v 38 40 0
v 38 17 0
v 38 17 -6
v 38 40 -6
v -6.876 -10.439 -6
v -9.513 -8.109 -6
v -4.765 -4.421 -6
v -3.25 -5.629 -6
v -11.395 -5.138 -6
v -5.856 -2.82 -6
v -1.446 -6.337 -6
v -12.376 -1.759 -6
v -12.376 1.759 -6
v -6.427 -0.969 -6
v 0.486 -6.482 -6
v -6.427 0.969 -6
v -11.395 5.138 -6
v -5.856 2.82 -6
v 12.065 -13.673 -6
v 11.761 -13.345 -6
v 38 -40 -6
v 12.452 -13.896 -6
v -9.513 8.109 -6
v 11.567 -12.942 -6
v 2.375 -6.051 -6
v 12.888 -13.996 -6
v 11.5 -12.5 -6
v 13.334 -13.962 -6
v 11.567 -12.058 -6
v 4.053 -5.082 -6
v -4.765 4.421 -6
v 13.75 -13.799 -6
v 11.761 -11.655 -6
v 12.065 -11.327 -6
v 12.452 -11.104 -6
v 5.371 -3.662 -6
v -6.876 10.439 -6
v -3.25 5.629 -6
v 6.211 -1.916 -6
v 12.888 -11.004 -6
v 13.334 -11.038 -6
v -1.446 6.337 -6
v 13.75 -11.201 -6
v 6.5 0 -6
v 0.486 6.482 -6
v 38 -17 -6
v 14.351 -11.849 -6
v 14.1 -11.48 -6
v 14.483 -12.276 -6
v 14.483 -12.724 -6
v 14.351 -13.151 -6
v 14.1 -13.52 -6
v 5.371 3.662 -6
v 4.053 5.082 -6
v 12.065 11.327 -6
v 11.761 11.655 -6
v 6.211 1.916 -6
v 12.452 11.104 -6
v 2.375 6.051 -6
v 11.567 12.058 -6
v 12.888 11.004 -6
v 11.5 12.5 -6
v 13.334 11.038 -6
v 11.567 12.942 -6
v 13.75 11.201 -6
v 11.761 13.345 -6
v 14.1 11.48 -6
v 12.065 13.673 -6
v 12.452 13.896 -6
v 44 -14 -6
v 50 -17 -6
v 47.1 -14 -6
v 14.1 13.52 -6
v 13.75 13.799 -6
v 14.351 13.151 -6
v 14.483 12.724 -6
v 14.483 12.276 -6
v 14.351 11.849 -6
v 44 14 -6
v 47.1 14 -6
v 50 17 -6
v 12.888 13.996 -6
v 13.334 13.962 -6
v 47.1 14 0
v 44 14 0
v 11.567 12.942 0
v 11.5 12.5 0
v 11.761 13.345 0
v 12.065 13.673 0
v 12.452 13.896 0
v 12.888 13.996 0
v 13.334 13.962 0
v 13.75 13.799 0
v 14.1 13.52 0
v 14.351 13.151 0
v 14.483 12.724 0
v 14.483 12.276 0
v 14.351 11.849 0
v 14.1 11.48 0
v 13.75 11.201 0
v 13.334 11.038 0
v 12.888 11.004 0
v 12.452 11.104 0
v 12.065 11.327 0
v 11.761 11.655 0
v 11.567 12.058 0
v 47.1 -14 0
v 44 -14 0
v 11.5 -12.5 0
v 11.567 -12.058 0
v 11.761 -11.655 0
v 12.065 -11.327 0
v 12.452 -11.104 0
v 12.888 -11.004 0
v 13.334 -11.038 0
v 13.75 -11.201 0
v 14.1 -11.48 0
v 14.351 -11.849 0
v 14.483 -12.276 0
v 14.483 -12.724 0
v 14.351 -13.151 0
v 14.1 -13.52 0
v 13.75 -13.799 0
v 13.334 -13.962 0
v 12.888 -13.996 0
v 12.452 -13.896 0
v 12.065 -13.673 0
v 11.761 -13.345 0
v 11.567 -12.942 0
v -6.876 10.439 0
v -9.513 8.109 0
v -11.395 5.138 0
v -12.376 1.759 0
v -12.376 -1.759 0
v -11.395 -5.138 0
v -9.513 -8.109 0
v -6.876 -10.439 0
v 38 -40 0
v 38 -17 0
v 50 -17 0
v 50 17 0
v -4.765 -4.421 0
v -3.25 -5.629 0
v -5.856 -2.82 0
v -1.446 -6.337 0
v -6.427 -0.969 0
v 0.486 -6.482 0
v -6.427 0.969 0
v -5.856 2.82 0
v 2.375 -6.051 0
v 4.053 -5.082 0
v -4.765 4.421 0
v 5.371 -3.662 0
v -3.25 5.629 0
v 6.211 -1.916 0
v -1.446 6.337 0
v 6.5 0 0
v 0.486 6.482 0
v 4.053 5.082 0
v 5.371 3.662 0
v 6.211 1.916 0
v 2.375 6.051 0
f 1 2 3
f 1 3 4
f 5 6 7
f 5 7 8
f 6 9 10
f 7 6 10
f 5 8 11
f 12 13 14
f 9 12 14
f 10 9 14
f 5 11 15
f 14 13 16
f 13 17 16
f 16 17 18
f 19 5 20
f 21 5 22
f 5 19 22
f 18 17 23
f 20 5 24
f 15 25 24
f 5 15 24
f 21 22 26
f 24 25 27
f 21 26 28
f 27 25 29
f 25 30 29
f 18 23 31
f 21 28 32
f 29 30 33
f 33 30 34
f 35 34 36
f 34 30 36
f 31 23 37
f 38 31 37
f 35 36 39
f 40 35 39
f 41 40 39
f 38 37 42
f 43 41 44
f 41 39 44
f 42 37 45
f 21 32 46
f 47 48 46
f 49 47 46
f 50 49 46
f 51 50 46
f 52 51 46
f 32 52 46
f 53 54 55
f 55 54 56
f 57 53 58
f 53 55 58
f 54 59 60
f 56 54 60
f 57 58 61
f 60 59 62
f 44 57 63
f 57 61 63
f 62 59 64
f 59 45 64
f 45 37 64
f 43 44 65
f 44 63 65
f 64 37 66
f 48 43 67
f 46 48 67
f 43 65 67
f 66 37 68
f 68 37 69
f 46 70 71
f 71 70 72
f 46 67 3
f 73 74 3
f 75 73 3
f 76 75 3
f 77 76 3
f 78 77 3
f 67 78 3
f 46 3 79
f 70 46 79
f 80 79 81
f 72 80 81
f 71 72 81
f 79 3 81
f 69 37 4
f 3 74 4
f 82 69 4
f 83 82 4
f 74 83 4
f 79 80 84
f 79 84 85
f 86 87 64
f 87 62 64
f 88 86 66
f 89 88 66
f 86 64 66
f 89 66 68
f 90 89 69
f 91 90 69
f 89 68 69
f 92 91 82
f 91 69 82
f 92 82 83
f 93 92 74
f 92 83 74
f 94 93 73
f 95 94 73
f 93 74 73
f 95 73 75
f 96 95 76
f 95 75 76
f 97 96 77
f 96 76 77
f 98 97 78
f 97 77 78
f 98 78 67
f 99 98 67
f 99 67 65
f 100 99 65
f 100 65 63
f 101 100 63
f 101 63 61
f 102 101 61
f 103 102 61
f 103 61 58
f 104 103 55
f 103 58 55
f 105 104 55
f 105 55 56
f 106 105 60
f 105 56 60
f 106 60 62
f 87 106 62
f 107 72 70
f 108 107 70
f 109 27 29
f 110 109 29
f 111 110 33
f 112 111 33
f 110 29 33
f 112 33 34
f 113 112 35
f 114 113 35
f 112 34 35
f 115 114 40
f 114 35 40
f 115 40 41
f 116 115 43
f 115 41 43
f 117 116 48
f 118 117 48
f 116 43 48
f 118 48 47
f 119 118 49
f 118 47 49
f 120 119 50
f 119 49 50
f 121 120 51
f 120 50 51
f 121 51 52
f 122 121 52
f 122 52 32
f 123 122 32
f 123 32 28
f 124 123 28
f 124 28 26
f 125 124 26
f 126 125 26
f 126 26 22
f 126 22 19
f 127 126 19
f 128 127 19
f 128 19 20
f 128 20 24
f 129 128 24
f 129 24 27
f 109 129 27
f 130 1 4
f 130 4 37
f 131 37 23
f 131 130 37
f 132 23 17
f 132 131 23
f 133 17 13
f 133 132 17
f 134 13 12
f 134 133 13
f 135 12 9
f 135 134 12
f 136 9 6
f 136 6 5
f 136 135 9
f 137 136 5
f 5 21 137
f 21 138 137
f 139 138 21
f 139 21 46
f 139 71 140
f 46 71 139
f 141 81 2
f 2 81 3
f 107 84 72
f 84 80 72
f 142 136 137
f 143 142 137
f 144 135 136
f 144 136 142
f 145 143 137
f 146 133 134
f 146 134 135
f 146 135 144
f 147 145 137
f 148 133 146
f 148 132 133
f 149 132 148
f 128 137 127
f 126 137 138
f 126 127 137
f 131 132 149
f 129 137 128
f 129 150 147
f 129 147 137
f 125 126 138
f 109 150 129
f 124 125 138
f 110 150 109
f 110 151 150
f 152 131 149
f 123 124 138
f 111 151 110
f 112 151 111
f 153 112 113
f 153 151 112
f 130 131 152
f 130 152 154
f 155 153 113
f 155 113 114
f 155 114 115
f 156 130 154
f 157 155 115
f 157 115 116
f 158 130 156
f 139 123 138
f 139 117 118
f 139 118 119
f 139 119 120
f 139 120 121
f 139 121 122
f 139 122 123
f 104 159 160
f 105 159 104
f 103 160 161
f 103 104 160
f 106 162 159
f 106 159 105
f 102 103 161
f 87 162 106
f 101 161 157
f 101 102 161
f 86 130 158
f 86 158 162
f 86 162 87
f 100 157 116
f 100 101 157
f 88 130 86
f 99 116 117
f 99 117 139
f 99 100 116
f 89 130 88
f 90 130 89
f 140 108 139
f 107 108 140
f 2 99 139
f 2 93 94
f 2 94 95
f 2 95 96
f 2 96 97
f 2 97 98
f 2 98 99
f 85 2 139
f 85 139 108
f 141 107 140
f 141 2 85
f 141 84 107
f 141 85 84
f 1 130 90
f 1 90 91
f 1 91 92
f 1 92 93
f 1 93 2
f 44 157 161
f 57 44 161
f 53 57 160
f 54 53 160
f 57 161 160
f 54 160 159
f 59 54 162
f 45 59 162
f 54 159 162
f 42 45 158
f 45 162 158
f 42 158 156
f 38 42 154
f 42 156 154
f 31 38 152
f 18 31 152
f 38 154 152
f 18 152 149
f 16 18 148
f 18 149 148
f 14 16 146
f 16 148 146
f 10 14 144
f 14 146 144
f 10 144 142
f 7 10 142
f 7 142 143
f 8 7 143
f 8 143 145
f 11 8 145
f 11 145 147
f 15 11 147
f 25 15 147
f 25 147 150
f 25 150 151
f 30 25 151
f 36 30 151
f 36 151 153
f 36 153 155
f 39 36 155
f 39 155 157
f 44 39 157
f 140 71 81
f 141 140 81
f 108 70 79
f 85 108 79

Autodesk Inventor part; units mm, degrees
ref_plane "YZ Plane" through (0, 0, 0) normal (1, 0, 0) x (0, 1, 0)
ref_plane "XZ Plane" through (0, 0, 0) normal (0, 1, 0) x (-1, 0, 0)
ref_plane "XY Plane" through (0, 0, 0) normal (0, 0, 1) x (1, 0, 0)
sketch "Sketch1" plane through (0, 0, 0) normal (0, 0, 1) x (1, 0, 0)
  circle A0 centre (0, 0) radius 2 construction
  circle A1 centre (0, 0) radius 6.5 construction
  line L0 (0, 0) -> (38, 0) construction
  arc A2 (-6.8763, 10.4387) -> (-6.8763, -10.4387) centre (0, 0) ccw
  circle A3 centre (0, 0) radius 6.5
  line L1 (38, 0) -> (38, -40)
  line L2 (38, 0) -> (38, 40)
  line L3 (38, 40) -> (-6.8763, 10.4387)
  line L4 (38, -40) -> (-6.8763, -10.4387)
  point P0 (0, 0)
  dimension "d0" = 38
  dimension "d1" = 25
  dimension "d2" = 13
  dimension "d3" = 40
  dimension "d4" = 40
extrude "Extrusion1" add sketch "Sketch1" against normal blind 6
sketch "Sketch2" plane through (0, 0, -6) normal (0, 0, -1) x (-1, 0, 0)
  circle A0 centre (-13, -12.5) radius 1.5 projected
  circle A1 centre (-13, 12.5) radius 1.5 projected
  point P0 (0, 0)
extrude "Extrusion2" cut sketch "Sketch2" against normal blind 6
sketch "Sketch3" plane through (0, 0, -6) normal (0, 0, -1) x (-1, 0, 0)
  line L0 (-38, 40) -> (-38, -40) projected
  line L1 (-38, 40) -> (-38, -40) construction
  line L2 (-38, 0) -> (-63, 0) construction
  line L3 (-50, 0) -> (-50, -17)
  line L4 (-50, 0) -> (-50, 17)
  line L5 (-50, -17) -> (-38, -17)
  line L6 (-50, 17) -> (-38, 17)
  line L7 (-47.1, -14) -> (-47.1, 0)
  line L8 (-47.1, 14) -> (-47.1, 0)
  line L9 (-47.1, -14) -> (-44, -14)
  line L10 (-44, -14) -> (-44, 0)
  line L11 (-47.1, 14) -> (-44, 14)
  line L12 (-44, 14) -> (-44, 0)
  line L13 (-38, -17) -> (-38, 17)
  point P0 (0, 0)
  dimension "d9" = 25
  dimension "d10" = 17
  dimension "d11" = 12
  dimension "d12" = 14
  dimension "d13" = 2.9
  dimension "d14" = 6
extrude "Extrusion3" add sketch "Sketch3" against normal blind 6
properties part number "Mecanum wheel support"
